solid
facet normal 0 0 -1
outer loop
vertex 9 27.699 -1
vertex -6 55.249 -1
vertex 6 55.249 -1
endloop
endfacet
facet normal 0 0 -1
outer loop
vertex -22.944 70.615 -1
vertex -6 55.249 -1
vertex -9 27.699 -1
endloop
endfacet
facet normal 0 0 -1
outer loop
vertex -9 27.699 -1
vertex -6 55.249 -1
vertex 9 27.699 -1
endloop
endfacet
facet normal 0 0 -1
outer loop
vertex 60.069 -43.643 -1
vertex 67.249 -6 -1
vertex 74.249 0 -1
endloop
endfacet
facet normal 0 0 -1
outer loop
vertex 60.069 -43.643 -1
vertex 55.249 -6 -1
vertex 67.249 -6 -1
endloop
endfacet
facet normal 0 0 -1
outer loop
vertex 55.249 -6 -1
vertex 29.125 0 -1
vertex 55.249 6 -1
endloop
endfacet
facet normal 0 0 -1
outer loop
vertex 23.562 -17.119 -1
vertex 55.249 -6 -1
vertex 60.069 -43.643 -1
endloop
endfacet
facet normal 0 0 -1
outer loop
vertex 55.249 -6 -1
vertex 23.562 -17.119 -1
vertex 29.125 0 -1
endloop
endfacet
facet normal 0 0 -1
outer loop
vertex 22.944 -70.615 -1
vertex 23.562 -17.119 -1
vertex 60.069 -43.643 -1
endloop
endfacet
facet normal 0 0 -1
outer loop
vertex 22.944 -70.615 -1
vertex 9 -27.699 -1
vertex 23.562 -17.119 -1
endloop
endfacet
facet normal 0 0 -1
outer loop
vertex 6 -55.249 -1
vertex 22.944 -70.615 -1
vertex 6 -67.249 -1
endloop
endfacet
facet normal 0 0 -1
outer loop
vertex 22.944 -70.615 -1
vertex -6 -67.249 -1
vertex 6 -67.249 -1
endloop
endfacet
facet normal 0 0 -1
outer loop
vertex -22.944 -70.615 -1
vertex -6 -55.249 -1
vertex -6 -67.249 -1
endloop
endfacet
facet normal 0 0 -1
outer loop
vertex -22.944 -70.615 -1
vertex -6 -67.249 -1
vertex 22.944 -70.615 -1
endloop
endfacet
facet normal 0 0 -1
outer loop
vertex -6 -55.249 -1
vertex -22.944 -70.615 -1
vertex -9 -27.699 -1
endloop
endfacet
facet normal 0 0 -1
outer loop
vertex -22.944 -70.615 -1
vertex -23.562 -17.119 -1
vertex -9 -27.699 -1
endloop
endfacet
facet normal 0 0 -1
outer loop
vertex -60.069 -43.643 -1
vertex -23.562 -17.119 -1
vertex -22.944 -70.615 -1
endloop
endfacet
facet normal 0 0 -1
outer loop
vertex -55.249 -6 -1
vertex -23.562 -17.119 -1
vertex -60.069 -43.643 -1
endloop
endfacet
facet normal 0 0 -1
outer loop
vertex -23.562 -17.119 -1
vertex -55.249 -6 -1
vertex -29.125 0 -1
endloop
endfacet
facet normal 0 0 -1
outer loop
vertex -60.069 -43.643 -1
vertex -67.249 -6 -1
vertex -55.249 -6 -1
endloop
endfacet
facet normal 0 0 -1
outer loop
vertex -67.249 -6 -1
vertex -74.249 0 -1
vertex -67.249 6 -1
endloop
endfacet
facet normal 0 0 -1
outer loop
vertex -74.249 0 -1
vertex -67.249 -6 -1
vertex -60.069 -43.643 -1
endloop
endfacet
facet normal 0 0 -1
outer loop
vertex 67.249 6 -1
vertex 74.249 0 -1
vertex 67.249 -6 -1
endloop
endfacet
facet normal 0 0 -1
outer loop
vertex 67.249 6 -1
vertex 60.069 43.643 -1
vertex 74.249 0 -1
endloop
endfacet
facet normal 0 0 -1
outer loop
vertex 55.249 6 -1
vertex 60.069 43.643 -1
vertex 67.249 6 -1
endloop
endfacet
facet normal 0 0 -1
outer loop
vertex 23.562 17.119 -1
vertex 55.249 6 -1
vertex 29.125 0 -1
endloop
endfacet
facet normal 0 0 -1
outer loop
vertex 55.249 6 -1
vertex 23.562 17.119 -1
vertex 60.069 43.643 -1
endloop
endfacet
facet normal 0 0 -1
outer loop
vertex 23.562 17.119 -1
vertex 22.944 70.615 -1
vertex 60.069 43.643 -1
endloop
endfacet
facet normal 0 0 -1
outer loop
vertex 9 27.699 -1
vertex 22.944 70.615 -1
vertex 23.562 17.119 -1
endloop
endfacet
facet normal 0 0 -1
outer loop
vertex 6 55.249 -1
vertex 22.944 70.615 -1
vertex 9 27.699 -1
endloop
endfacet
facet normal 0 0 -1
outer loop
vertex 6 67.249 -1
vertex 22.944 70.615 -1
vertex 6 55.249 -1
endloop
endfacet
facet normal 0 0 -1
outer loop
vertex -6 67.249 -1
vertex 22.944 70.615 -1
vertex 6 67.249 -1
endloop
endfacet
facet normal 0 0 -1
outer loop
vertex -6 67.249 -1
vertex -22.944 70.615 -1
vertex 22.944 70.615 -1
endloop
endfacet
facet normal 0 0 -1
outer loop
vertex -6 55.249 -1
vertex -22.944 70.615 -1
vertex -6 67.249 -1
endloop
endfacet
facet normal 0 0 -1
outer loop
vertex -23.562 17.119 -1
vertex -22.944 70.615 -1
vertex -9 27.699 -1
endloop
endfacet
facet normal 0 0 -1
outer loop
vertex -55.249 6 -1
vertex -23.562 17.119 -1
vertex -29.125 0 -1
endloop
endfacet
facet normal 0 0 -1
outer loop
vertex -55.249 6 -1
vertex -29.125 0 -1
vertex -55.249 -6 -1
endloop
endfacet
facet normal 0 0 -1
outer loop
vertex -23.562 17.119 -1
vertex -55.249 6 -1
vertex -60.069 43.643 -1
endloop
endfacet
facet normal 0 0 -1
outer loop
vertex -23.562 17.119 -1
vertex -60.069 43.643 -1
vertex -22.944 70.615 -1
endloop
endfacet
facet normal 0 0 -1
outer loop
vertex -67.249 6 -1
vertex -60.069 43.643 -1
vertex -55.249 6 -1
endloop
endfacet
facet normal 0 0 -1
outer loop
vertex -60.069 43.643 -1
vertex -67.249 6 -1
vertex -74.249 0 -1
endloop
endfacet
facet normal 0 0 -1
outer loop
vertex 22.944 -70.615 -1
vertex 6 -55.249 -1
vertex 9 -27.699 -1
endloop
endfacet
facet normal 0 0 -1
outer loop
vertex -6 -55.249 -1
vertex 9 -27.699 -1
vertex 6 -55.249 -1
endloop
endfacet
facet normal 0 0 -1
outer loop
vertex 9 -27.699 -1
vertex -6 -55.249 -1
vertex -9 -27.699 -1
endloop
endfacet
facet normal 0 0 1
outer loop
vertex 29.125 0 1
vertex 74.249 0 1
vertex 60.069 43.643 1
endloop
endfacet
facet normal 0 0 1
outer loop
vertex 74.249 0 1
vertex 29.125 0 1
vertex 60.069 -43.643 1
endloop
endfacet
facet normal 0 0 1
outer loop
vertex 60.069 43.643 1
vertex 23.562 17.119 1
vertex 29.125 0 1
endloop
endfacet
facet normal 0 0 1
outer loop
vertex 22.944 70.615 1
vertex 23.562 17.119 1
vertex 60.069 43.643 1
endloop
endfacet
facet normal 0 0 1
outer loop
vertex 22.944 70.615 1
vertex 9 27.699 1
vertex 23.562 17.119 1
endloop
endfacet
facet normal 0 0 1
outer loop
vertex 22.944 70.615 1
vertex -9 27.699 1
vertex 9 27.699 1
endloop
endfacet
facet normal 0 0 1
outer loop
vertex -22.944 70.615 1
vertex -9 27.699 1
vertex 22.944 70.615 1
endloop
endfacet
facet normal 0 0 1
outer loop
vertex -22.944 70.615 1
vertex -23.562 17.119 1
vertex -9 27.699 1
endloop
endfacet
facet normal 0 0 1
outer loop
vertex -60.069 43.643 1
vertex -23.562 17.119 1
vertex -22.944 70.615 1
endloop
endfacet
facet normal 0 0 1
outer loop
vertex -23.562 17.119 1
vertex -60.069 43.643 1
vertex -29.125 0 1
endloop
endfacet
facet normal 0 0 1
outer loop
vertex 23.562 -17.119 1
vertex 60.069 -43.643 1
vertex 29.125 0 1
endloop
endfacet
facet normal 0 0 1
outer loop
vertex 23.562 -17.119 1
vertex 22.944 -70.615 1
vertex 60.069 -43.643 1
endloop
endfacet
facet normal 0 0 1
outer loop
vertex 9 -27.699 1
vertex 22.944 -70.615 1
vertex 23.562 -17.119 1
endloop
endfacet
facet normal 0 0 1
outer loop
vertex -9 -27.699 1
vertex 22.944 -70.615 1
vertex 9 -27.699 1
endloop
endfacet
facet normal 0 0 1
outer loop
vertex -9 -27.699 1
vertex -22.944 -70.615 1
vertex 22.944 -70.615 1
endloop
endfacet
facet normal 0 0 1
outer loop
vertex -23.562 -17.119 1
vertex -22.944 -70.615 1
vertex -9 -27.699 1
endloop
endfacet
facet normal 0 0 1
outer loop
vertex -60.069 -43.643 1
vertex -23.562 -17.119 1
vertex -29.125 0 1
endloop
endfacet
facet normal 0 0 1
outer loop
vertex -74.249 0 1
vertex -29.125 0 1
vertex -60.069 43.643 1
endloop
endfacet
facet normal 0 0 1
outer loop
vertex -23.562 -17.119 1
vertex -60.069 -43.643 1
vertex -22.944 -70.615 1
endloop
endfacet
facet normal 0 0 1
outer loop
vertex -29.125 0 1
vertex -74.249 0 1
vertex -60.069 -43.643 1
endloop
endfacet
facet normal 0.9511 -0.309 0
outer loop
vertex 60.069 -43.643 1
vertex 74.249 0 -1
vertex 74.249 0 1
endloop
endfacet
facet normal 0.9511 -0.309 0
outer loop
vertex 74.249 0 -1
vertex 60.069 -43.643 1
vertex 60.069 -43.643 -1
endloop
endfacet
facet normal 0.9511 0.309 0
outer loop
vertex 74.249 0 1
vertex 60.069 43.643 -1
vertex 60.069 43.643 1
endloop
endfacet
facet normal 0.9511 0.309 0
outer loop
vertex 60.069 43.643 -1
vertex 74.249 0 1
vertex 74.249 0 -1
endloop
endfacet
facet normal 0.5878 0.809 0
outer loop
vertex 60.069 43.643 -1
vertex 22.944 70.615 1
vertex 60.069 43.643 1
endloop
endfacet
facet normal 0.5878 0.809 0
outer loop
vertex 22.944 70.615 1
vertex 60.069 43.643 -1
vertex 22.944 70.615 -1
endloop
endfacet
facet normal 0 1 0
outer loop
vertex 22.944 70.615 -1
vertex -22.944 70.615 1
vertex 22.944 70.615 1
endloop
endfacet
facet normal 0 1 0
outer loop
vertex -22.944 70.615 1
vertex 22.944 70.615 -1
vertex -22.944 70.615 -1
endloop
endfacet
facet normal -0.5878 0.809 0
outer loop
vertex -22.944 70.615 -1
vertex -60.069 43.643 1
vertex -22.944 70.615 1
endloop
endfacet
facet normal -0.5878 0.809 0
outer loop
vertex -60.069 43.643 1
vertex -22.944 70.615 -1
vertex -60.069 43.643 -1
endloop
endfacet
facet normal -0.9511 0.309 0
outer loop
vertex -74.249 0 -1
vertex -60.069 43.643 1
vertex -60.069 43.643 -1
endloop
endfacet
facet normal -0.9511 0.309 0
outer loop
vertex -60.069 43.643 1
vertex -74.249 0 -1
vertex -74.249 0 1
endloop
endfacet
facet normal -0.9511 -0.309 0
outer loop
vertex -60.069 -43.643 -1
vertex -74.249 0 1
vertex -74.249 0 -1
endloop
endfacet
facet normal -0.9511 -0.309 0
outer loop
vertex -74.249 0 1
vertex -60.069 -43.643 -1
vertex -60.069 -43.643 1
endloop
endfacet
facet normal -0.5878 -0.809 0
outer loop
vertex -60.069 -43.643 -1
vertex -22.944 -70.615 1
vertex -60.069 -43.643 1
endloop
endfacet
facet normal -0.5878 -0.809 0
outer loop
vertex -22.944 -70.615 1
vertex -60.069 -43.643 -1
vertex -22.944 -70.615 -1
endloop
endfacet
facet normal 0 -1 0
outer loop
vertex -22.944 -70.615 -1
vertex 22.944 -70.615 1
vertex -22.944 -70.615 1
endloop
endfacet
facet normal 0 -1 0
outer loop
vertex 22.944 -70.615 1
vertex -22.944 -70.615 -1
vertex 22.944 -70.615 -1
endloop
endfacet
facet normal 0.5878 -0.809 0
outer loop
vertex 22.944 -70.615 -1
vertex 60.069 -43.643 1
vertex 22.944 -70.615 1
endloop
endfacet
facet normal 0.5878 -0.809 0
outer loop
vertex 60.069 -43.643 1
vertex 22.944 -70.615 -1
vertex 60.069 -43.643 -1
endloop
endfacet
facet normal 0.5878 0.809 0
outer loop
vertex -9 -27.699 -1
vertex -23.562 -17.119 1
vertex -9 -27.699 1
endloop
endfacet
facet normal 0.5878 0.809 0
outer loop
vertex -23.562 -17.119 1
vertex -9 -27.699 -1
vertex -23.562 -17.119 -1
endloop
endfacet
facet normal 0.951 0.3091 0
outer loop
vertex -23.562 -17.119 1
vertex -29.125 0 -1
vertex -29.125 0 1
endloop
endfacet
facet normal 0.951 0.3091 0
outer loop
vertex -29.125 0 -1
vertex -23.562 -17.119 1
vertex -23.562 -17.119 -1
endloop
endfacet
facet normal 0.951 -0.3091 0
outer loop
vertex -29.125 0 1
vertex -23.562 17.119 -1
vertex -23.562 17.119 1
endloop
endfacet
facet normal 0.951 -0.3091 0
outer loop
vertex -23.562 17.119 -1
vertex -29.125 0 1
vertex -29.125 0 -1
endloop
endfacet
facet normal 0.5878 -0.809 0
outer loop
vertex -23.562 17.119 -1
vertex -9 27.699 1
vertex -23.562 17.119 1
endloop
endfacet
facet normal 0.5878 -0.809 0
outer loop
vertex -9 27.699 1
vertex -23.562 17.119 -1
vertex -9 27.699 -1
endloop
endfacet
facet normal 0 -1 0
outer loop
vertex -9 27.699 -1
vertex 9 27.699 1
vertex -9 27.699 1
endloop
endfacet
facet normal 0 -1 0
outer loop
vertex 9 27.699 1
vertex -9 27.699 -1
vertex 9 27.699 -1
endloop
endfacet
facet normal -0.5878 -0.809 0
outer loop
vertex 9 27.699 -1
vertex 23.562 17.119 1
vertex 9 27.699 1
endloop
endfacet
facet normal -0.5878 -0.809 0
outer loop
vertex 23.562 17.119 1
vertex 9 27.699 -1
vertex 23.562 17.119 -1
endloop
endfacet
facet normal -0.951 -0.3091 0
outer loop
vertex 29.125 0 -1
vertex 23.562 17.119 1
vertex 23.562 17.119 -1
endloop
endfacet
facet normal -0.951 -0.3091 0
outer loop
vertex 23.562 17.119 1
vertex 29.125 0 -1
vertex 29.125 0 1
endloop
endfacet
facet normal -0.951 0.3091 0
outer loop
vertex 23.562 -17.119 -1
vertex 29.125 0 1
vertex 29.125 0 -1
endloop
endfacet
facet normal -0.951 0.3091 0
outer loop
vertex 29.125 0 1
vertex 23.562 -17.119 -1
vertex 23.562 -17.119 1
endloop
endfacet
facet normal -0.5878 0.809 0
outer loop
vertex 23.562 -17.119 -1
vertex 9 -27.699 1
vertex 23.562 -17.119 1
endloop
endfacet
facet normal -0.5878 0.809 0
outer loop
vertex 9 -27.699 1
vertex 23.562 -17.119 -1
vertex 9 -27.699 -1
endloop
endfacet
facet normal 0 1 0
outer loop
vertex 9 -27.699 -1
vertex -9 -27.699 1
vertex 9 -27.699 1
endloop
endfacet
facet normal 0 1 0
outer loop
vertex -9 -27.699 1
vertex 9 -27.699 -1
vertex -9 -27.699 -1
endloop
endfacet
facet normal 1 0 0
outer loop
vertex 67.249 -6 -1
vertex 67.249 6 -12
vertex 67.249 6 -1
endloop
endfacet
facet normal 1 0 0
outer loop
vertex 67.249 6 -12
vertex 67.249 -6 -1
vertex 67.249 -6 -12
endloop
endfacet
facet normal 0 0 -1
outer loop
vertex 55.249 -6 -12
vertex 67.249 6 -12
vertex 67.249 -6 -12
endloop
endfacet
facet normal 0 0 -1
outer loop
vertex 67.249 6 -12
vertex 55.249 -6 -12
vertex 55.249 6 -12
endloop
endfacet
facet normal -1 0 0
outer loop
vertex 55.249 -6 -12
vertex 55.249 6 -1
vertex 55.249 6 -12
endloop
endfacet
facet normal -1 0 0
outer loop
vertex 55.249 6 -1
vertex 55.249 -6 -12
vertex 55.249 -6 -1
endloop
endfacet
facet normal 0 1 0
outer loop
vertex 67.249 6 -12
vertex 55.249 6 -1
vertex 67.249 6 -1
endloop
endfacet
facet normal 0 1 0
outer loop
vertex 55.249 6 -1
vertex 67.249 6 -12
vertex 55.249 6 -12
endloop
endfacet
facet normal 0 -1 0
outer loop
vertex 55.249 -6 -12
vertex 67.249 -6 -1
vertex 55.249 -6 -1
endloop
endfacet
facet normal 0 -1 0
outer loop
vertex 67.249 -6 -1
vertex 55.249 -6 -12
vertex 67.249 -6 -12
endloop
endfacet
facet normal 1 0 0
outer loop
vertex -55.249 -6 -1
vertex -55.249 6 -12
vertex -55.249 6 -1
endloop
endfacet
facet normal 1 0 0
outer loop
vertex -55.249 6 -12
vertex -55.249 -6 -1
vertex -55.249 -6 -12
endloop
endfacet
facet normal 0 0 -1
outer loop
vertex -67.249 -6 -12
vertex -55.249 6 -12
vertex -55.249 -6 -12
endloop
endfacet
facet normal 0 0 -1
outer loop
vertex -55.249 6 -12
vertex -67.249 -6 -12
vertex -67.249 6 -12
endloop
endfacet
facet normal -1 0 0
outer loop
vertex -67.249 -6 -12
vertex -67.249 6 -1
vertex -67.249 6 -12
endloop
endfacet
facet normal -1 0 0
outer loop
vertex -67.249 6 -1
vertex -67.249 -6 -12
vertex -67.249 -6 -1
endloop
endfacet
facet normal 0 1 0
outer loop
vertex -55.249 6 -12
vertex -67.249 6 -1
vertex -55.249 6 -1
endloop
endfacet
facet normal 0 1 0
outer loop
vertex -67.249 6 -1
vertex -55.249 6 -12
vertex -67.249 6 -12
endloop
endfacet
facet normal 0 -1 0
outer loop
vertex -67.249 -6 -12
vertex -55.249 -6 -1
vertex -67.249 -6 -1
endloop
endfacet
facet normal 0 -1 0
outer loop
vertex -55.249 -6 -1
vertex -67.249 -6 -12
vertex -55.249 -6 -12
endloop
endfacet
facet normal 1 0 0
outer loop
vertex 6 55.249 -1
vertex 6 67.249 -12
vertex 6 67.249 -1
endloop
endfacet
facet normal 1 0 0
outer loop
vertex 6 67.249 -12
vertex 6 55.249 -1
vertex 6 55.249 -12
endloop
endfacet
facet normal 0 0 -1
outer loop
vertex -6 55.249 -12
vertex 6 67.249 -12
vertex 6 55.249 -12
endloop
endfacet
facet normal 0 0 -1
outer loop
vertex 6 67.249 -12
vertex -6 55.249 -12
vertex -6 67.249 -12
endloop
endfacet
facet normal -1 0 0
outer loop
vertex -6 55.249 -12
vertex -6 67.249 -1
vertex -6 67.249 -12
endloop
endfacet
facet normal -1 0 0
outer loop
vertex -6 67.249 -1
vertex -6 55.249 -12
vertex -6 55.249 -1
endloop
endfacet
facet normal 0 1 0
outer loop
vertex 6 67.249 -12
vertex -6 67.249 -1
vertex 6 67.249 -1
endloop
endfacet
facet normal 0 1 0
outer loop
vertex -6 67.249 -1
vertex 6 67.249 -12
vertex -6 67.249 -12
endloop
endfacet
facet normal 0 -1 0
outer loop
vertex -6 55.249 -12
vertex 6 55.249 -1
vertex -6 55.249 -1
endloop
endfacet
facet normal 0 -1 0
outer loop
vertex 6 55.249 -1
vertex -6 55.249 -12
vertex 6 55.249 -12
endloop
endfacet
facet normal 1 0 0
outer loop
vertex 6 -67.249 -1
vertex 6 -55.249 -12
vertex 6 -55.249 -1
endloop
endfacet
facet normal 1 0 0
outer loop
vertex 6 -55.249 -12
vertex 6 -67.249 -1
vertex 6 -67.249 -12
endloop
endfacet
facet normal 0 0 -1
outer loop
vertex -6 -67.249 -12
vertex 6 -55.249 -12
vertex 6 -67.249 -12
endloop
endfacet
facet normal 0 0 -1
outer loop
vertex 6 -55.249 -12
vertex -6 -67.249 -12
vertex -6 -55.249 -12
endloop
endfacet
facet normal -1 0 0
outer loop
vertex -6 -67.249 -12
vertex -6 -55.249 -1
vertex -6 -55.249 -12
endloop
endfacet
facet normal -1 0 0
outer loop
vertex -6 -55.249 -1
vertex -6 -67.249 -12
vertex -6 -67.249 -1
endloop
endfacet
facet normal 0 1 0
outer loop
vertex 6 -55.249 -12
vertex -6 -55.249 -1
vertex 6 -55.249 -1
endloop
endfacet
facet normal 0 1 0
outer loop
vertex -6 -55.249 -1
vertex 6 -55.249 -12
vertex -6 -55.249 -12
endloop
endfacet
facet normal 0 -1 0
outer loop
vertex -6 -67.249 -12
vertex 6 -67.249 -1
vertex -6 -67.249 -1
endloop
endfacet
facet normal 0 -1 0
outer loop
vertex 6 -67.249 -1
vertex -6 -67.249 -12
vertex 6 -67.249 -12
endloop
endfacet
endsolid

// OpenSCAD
// file: decagon_lampshade_common.scad
// common code for the lampshade

wall_thickness = 3.0;
bisected_internal_angle = 18;
led_square_length = 36;
interior_channel_width = 13;


module decagon(internal_radius) {
  circle(r = internal_radius, $fn = 10);
}

// decagon has 10 sides, which means the circle that would circumscribe it
// is divided into angles of 36 degrees. But the radii from those points would hit
// the _corners_ of the LED square, so we want to draw a line up through that sqaure
// to create a right triangle whose right angle sits at the intersection with the 
// middle of the square. From that we can derive the hypotenuse of that triangle, which is the radius
function radius_interior(length) = ((length/2)/sin(bisected_internal_angle));

// the standard case of returning the radius interior based on the led_square_length
function standard_radius_interior() = radius_interior(led_square_length);
// main file
// code to construct the decagon's base

include <decagon_lampshade_common.scad>;

floor_thickness = 2.0;
wall_edge = standard_radius_interior() + interior_channel_width + wall_thickness;
foot_dimension = 12;
foot_fudge_factor = 7;

// create a decagon that is the full base
linear_extrude(height = floor_thickness, center = true, twist = 0) {
  difference() {
    decagon(wall_edge);
    decagon(standard_radius_interior() - (standard_radius_interior()/2));
  }
}

module foot(x,y) {
  translate([x,y,-foot_dimension]) {
     cube([foot_dimension, foot_dimension, foot_dimension]);
  }
}

// feet
foot(wall_edge - foot_dimension -foot_fudge_factor,-foot_dimension/2);
foot(-wall_edge + foot_fudge_factor,-foot_dimension/2);
foot(-foot_dimension/2, wall_edge - foot_dimension - foot_fudge_factor);
foot(-foot_dimension/2, -wall_edge + foot_fudge_factor);
